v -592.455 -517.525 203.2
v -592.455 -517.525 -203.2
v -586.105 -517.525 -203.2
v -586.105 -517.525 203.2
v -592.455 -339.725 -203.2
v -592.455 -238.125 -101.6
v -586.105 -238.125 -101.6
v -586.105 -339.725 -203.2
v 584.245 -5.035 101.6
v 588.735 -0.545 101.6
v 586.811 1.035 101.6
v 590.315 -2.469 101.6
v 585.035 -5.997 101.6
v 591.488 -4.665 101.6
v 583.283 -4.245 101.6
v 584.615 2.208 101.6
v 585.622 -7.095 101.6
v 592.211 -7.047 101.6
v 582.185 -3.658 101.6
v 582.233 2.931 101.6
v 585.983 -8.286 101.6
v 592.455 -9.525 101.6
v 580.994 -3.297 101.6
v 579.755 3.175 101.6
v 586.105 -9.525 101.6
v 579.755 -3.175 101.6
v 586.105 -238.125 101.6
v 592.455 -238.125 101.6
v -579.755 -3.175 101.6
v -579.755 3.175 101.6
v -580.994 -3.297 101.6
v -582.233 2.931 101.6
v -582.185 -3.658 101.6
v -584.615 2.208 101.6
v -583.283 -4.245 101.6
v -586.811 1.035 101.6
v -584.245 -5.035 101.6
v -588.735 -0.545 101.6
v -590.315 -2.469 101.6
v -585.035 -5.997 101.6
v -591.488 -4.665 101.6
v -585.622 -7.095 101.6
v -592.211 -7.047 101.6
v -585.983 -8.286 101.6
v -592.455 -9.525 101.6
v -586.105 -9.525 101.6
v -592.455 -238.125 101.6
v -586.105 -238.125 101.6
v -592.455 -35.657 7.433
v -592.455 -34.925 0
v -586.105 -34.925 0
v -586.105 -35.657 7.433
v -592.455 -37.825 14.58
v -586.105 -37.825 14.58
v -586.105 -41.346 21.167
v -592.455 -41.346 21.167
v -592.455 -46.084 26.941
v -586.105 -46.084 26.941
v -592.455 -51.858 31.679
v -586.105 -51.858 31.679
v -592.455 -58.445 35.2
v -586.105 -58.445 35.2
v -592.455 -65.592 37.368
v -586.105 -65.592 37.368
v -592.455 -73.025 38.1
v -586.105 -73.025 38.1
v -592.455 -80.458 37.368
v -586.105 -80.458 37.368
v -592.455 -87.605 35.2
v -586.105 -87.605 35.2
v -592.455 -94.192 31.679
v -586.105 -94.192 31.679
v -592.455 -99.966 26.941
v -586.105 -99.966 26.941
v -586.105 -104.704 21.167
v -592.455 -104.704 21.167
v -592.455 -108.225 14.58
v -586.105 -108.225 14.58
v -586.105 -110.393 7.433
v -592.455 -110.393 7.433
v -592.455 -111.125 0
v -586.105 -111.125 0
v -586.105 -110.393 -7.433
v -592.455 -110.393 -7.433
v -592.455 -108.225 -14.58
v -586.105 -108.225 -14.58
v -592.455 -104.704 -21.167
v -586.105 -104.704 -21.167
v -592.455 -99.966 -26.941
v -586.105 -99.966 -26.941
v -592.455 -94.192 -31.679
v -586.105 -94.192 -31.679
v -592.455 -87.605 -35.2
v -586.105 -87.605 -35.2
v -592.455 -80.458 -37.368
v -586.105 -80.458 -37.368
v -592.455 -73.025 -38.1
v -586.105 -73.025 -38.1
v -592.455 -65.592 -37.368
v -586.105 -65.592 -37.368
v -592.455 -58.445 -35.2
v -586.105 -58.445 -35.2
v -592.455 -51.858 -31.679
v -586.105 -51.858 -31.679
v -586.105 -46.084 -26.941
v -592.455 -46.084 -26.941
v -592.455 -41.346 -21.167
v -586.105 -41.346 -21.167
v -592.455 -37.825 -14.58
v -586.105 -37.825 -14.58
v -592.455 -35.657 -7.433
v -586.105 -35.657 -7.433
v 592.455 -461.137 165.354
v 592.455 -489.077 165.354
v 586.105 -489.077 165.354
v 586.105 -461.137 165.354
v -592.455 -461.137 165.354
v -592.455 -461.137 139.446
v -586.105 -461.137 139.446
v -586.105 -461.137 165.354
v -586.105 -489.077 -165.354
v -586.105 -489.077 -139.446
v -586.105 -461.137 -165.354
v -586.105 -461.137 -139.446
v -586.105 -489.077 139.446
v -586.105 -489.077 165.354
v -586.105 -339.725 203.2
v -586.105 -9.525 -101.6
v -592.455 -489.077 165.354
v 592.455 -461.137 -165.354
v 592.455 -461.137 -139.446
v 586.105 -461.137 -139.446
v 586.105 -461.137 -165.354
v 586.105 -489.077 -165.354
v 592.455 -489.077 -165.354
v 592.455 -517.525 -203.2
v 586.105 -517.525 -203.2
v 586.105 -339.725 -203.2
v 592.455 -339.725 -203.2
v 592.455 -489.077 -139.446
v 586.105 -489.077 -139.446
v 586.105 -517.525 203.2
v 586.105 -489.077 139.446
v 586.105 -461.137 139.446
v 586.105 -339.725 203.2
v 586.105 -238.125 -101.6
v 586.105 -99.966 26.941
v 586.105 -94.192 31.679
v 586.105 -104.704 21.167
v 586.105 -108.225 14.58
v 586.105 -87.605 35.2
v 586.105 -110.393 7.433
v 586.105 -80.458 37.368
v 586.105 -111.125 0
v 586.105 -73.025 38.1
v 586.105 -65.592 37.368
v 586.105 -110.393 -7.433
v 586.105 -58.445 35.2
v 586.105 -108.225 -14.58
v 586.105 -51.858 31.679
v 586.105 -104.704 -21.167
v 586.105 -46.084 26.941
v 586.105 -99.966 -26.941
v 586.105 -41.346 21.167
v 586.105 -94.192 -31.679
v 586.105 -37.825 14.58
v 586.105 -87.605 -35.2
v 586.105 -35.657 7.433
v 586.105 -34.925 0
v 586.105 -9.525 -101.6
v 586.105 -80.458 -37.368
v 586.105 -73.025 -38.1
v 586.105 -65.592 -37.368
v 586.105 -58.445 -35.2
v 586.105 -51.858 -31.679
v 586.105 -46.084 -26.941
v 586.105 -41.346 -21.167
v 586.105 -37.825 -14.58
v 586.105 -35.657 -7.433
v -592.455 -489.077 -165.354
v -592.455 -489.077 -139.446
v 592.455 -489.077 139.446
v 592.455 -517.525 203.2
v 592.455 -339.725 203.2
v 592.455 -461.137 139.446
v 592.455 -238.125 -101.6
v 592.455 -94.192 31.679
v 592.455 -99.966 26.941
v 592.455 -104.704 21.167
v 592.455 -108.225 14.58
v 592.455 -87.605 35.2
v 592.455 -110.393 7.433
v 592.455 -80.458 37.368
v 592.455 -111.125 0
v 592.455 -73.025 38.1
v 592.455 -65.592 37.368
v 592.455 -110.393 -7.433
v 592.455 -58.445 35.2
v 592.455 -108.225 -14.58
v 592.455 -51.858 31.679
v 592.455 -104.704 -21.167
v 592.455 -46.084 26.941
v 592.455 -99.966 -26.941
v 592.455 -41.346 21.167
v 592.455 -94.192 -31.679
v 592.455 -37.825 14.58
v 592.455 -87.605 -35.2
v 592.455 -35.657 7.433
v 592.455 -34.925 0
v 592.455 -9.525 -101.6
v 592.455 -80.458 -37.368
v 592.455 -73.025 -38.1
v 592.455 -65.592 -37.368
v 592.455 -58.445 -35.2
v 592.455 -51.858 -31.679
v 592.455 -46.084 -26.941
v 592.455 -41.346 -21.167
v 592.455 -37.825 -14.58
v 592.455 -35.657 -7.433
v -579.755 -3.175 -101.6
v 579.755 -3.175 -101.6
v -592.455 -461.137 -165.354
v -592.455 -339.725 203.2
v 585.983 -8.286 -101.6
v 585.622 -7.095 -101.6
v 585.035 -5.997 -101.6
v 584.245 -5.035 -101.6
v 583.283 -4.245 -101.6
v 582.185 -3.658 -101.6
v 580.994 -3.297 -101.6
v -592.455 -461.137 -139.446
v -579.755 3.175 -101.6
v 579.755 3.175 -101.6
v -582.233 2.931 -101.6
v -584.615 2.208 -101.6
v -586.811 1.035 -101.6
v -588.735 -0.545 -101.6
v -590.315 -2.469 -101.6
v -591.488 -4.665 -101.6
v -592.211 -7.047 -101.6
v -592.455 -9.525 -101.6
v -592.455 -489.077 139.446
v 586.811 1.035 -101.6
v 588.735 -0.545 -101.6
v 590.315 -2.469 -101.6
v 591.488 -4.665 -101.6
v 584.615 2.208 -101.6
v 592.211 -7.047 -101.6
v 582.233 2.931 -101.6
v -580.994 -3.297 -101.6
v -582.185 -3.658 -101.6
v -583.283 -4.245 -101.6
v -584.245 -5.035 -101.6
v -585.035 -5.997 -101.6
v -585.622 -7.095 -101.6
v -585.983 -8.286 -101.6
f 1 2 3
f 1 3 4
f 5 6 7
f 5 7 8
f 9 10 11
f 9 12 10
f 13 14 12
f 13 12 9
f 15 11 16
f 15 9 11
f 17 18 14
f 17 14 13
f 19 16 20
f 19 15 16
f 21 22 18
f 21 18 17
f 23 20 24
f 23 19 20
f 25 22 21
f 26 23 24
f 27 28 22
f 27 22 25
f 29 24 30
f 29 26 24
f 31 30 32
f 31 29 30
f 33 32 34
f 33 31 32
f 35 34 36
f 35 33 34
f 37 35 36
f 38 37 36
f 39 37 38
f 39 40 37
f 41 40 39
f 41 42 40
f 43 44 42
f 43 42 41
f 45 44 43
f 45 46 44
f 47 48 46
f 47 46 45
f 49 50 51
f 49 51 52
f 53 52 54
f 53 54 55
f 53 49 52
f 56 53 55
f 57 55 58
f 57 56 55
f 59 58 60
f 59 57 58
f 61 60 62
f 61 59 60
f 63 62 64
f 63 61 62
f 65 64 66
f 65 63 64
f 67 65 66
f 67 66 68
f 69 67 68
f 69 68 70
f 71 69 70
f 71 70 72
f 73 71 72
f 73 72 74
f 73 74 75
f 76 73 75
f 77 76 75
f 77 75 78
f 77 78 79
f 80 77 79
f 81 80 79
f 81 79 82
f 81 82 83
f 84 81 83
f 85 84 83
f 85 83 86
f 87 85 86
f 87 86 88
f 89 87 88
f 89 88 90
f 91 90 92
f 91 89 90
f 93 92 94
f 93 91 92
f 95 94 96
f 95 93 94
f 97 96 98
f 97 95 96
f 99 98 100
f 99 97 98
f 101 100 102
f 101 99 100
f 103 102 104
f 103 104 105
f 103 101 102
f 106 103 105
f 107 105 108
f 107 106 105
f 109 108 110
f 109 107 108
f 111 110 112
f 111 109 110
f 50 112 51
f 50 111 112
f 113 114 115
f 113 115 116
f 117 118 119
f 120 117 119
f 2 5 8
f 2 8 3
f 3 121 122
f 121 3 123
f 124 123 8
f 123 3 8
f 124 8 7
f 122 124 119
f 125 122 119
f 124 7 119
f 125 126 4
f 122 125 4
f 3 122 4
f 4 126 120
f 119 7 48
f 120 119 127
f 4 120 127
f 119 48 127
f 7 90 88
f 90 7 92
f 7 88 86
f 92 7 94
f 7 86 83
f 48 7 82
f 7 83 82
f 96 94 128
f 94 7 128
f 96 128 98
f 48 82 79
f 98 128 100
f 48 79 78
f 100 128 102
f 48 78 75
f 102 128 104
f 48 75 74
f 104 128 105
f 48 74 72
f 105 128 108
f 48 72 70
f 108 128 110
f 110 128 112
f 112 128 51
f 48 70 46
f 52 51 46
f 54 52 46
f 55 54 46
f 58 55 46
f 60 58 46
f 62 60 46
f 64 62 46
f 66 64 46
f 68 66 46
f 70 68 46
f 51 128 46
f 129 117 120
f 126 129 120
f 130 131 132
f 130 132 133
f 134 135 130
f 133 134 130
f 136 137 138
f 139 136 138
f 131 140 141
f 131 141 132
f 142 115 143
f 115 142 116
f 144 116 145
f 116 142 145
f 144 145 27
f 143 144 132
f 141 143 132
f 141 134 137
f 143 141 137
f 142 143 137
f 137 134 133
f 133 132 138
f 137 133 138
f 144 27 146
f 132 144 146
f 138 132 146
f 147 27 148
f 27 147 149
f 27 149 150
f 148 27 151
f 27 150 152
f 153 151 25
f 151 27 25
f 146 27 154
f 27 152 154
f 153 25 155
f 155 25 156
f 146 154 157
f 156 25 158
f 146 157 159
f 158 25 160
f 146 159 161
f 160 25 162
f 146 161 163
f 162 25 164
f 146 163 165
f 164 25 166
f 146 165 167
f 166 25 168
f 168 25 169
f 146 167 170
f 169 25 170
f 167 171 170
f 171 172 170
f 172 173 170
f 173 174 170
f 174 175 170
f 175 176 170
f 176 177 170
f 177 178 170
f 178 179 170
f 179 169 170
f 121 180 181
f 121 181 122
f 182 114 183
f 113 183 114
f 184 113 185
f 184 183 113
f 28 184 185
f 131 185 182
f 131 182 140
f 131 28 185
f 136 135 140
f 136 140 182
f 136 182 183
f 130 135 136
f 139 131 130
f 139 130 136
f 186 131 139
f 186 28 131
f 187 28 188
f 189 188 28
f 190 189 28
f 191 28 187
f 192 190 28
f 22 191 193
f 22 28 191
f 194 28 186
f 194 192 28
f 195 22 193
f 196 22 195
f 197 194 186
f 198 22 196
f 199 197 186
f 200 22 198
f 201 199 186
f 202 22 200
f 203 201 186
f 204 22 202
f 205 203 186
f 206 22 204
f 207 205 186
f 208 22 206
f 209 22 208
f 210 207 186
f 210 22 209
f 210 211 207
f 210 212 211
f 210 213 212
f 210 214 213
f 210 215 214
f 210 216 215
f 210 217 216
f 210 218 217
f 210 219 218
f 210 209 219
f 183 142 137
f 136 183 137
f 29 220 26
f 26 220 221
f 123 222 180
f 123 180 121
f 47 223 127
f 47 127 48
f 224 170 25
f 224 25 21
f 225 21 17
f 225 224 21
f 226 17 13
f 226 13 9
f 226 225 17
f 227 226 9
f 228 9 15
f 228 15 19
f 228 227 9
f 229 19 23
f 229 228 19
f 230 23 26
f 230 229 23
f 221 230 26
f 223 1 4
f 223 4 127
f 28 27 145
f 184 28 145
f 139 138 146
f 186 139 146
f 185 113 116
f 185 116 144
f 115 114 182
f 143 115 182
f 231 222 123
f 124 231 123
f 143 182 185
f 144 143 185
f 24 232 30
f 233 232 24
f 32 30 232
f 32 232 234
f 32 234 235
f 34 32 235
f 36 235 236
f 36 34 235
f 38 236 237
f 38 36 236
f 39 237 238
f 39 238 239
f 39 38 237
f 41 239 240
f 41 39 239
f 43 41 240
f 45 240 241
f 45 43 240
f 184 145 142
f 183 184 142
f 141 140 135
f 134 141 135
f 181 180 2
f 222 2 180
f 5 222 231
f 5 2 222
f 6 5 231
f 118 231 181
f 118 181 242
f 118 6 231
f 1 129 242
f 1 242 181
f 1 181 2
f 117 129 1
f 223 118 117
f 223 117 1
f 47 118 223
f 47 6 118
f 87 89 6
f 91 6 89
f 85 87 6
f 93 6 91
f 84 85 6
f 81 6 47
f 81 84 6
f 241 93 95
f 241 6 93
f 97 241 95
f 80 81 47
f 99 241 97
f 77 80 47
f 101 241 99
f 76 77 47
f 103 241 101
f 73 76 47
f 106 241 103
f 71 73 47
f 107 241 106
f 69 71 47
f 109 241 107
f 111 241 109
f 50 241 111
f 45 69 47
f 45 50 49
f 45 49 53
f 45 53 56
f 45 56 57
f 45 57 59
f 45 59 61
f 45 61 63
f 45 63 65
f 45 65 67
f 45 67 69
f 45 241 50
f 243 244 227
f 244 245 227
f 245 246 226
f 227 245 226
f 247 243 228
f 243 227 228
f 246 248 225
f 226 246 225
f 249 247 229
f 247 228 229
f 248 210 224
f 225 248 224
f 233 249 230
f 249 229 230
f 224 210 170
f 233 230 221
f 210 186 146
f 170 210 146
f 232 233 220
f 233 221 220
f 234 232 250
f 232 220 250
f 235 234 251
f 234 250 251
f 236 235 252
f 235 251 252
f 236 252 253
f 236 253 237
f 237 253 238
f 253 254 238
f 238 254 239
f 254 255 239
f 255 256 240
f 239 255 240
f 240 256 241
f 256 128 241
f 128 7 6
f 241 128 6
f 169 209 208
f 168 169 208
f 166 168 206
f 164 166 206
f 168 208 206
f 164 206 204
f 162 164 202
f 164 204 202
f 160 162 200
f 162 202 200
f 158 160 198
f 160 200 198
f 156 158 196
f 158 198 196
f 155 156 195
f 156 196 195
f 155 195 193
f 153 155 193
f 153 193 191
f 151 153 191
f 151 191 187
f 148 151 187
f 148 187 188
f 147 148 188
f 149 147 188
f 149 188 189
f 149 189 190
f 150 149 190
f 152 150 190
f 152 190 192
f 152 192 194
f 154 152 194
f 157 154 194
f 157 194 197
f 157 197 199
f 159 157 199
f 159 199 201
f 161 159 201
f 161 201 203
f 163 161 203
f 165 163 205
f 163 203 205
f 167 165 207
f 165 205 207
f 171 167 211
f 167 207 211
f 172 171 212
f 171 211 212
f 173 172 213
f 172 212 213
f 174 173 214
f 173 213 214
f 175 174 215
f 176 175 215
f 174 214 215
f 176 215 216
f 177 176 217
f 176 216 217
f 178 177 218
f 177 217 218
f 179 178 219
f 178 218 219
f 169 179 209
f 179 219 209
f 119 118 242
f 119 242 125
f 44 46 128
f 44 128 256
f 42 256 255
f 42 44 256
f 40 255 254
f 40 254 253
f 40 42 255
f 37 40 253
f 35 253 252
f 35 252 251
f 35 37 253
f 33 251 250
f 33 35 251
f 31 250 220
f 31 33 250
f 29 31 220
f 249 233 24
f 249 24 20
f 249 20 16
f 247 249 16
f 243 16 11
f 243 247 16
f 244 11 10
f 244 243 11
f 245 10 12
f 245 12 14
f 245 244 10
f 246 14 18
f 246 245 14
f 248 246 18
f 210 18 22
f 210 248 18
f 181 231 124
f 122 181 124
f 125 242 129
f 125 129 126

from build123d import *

# Parameters (mm, degrees)
BASE_FLANGE1_START             = -3.175
BASE_FLANGE1_OUTLINE_W         = 1184.91
BASE_FLANGE1_OUTLINE_H         = 203.2
BASE_FLANGE1_DEPTH             = 6.35
EDGE_FLANGE1_STRIP_W           = 48.1
EDGE_FLANGE1_STRIP_H           = 6.35
EDGE_FLANGE1_STRIP_CUT_DEPTH   = 203.2
EDGE_FLANGE1_STRIP_2_W         = 48.1
EDGE_FLANGE1_STRIP_2_H         = 6.35
EDGE_FLANGE1_STRIP_CUT_2_DEPTH = 203.2
EDGE_FLANGE1_DEPTH             = 203.2
EDGE_FLANGE1_BEND_DEPTH        = 203.2
BOSS_EXTRUDE1_START            = -6.35
BOSS_EXTRUDE1_DEPTH            = 6.35
CUT_EXTRUDE1_REACH             = 1310.867
SKETCH13_R                     = 38.1
SKETCH13_W                     = 25.908
SKETCH13_H                     = 27.94
BOSS_EXTRUDE2_DEPTH            = 6.35
MIRROR3_START                  = -165.354
MIRROR3_OUTLINE_W              = 6.35
MIRROR3_OUTLINE_H              = 27.94
MIRROR3_DEPTH                  = 25.908
MIRROR3_START_2                = 139.446
MIRROR3_2_OUTLINE_W            = 6.35
MIRROR3_2_OUTLINE_H            = 27.94
MIRROR3_2_DEPTH                = 25.908


# Read off the part's stored shape, not the designer's step: Base-Flange1, Mirror3
# Sheet-metal steps are written as plain solids
with BuildPart() as part:
    # Base-Flange1 outline → Base-Flange1 (new body)
    with BuildSketch(Plane(origin=(0, 0, 0), x_dir=(1, 0, 0), z_dir=(0, 1, 0)).offset(BASE_FLANGE1_START)):
        Rectangle(BASE_FLANGE1_OUTLINE_W, BASE_FLANGE1_OUTLINE_H)
    extrude(amount=BASE_FLANGE1_DEPTH)

    # Edge-Flange1 strip (across the edge) → Edge-Flange1 strip cut (cut)
    with BuildSketch(Plane(origin=(592.455, -3.175, -101.6), x_dir=(-1, 0, 0), z_dir=(0, 0, 1))):
        with Locations((-11.35, -3.175)):
            Rectangle(EDGE_FLANGE1_STRIP_W, EDGE_FLANGE1_STRIP_H)
    extrude(amount=EDGE_FLANGE1_STRIP_CUT_DEPTH, mode=Mode.SUBTRACT)

    # Edge-Flange1 strip 2 (across the edge) → Edge-Flange1 strip cut 2 (cut)
    with BuildSketch(Plane(origin=(-592.455, -3.175, 101.6), x_dir=(1, 0, 0), z_dir=(0, 0, -1))):
        with Locations((-11.35, -3.175)):
            Rectangle(EDGE_FLANGE1_STRIP_2_W, EDGE_FLANGE1_STRIP_2_H)
    extrude(amount=EDGE_FLANGE1_STRIP_CUT_2_DEPTH, mode=Mode.SUBTRACT)

    # Edge-Flange1 section (across the edge) → Edge-Flange1 (add)
    with BuildSketch(Plane(origin=(592.455, -3.175, -101.6), x_dir=(-1, 0, 0), z_dir=(0, 0, 1))):
        with BuildLine():
            Line((0, 6.35), (0, 514.35))
            Line((0, 514.35), (6.35, 514.35))
            Line((6.35, 514.35), (6.35, 6.35))
            ThreePointArc((6.35, 6.35), (8.209871939, 1.859871939), (12.7, 0))
            Line((12.7, 0), (12.7, -6.35))
            ThreePointArc((12.7, -6.35), (3.719743879, -2.630256121), (0, 6.35))
        make_face()
    extrude(amount=EDGE_FLANGE1_DEPTH)

    # Edge-Flange1 section 2 (across the edge) → Edge-Flange1 bend (add)
    with BuildSketch(Plane(origin=(-592.455, -3.175, 101.6), x_dir=(1, 0, 0), z_dir=(0, 0, -1))):
        with BuildLine():
            Line((0, 6.35), (0, 514.35))
            Line((0, 514.35), (6.35, 514.35))
            Line((6.35, 514.35), (6.35, 6.35))
            ThreePointArc((6.35, 6.35), (8.209871939, 1.859871939), (12.7, 0))
            Line((12.7, 0), (12.7, -6.35))
            ThreePointArc((12.7, -6.35), (3.719743879, -2.630256121), (0, 6.35))
        make_face()
    extrude(amount=EDGE_FLANGE1_BEND_DEPTH)

    # Sketch12 → Boss-Extrude1 (add)
    with BuildSketch(Plane(origin=(592.455, 0, 0), x_dir=(0, 0, -1), z_dir=(1, 0, 0)).offset(BOSS_EXTRUDE1_START)):
        Polygon((-101.6, -238.125), (-203.2, -339.725), (-203.2, -517.525), (-101.6, -517.525), align=None)
        Polygon((203.2, -339.725), (101.6, -238.125), (101.6, -517.525), (203.2, -517.525), align=None)
    extrude(amount=BOSS_EXTRUDE1_DEPTH)

    # Sketch13 → Cut-Extrude1 (cut, up to next)
    with BuildSketch(Plane(origin=(592.455, 0, 0), x_dir=(0, 0, -1), z_dir=(1, 0, 0)), mode=Mode.PRIVATE) as cut_extrude1_sk1:
        with Locations(Location((0, -73.025, 0), (0, 0, 90))):
            Circle(SKETCH13_R)
    cut_extrude1_tool1 = extrude(cut_extrude1_sk1.sketch, amount=-CUT_EXTRUDE1_REACH, mode=Mode.PRIVATE) & part.part
    # Sketch13 → Cut-Extrude1 (cut, up to next)
    with BuildSketch(Plane(origin=(592.455, 0, 0), x_dir=(0, 0, -1), z_dir=(1, 0, 0)), mode=Mode.PRIVATE) as cut_extrude1_sk2:
        with Locations((152.4, -475.107)):
            Rectangle(SKETCH13_W, SKETCH13_H)
    cut_extrude1_tool2 = extrude(cut_extrude1_sk2.sketch, amount=-CUT_EXTRUDE1_REACH, mode=Mode.PRIVATE) & part.part
    # Sketch13 → Cut-Extrude1 (cut, up to next)
    with BuildSketch(Plane(origin=(592.455, 0, 0), x_dir=(0, 0, -1), z_dir=(1, 0, 0)), mode=Mode.PRIVATE) as cut_extrude1_sk3:
        with Locations((-152.4, -475.107)):
            Rectangle(SKETCH13_W, SKETCH13_H)
    cut_extrude1_tool3 = extrude(cut_extrude1_sk3.sketch, amount=-CUT_EXTRUDE1_REACH, mode=Mode.PRIVATE) & part.part
    cut_extrude1_1 = cut_extrude1_tool1.solids().sort_by_distance((592.455, -73.025, 0))[0]
    add(cut_extrude1_1, mode=Mode.SUBTRACT)
    cut_extrude1_2 = cut_extrude1_tool2.solids().sort_by_distance((592.455, -475.107, -152.4))[0]
    add(cut_extrude1_2, mode=Mode.SUBTRACT)
    cut_extrude1_3 = cut_extrude1_tool3.solids().sort_by_distance((592.455, -475.107, 152.4))[0]
    add(cut_extrude1_3, mode=Mode.SUBTRACT)
    cut_extrude1 = cut_extrude1_1 + cut_extrude1_2 + cut_extrude1_3  # Cut-Extrude1 as one shape, for the pattern or mirror that repeats it

    # Mirror1: Cut-Extrude1 across plane
    add(cut_extrude1.mirror(Plane(origin=(0, 0, 0), x_dir=(0, 0, 1), z_dir=(1, 0, 0))), mode=Mode.SUBTRACT)

    # Sketch14 → Boss-Extrude2 (add)
    with BuildSketch(Plane.ZY.offset(592.455)):
        Polygon((203.2, -517.525), (203.2, -339.725), (101.6, -238.125), (-101.6, -238.125), (-203.2, -339.725), (-203.2, -517.525), align=None)
    extrude(amount=-BOSS_EXTRUDE2_DEPTH)

    # Mirror3 outline → Mirror3 (cut)
    with BuildSketch(Plane.XY.offset(MIRROR3_START)):
        with Locations((-589.28, -475.107)):
            Rectangle(MIRROR3_OUTLINE_W, MIRROR3_OUTLINE_H)
    extrude(amount=MIRROR3_DEPTH, mode=Mode.SUBTRACT)

    # Mirror3 2 outline → Mirror3 2 (cut)
    with BuildSketch(Plane.XY.offset(MIRROR3_START_2)):
        with Locations((-589.28, -475.107)):
            Rectangle(MIRROR3_2_OUTLINE_W, MIRROR3_2_OUTLINE_H)
    extrude(amount=MIRROR3_2_DEPTH, mode=Mode.SUBTRACT)


solid = part.part
